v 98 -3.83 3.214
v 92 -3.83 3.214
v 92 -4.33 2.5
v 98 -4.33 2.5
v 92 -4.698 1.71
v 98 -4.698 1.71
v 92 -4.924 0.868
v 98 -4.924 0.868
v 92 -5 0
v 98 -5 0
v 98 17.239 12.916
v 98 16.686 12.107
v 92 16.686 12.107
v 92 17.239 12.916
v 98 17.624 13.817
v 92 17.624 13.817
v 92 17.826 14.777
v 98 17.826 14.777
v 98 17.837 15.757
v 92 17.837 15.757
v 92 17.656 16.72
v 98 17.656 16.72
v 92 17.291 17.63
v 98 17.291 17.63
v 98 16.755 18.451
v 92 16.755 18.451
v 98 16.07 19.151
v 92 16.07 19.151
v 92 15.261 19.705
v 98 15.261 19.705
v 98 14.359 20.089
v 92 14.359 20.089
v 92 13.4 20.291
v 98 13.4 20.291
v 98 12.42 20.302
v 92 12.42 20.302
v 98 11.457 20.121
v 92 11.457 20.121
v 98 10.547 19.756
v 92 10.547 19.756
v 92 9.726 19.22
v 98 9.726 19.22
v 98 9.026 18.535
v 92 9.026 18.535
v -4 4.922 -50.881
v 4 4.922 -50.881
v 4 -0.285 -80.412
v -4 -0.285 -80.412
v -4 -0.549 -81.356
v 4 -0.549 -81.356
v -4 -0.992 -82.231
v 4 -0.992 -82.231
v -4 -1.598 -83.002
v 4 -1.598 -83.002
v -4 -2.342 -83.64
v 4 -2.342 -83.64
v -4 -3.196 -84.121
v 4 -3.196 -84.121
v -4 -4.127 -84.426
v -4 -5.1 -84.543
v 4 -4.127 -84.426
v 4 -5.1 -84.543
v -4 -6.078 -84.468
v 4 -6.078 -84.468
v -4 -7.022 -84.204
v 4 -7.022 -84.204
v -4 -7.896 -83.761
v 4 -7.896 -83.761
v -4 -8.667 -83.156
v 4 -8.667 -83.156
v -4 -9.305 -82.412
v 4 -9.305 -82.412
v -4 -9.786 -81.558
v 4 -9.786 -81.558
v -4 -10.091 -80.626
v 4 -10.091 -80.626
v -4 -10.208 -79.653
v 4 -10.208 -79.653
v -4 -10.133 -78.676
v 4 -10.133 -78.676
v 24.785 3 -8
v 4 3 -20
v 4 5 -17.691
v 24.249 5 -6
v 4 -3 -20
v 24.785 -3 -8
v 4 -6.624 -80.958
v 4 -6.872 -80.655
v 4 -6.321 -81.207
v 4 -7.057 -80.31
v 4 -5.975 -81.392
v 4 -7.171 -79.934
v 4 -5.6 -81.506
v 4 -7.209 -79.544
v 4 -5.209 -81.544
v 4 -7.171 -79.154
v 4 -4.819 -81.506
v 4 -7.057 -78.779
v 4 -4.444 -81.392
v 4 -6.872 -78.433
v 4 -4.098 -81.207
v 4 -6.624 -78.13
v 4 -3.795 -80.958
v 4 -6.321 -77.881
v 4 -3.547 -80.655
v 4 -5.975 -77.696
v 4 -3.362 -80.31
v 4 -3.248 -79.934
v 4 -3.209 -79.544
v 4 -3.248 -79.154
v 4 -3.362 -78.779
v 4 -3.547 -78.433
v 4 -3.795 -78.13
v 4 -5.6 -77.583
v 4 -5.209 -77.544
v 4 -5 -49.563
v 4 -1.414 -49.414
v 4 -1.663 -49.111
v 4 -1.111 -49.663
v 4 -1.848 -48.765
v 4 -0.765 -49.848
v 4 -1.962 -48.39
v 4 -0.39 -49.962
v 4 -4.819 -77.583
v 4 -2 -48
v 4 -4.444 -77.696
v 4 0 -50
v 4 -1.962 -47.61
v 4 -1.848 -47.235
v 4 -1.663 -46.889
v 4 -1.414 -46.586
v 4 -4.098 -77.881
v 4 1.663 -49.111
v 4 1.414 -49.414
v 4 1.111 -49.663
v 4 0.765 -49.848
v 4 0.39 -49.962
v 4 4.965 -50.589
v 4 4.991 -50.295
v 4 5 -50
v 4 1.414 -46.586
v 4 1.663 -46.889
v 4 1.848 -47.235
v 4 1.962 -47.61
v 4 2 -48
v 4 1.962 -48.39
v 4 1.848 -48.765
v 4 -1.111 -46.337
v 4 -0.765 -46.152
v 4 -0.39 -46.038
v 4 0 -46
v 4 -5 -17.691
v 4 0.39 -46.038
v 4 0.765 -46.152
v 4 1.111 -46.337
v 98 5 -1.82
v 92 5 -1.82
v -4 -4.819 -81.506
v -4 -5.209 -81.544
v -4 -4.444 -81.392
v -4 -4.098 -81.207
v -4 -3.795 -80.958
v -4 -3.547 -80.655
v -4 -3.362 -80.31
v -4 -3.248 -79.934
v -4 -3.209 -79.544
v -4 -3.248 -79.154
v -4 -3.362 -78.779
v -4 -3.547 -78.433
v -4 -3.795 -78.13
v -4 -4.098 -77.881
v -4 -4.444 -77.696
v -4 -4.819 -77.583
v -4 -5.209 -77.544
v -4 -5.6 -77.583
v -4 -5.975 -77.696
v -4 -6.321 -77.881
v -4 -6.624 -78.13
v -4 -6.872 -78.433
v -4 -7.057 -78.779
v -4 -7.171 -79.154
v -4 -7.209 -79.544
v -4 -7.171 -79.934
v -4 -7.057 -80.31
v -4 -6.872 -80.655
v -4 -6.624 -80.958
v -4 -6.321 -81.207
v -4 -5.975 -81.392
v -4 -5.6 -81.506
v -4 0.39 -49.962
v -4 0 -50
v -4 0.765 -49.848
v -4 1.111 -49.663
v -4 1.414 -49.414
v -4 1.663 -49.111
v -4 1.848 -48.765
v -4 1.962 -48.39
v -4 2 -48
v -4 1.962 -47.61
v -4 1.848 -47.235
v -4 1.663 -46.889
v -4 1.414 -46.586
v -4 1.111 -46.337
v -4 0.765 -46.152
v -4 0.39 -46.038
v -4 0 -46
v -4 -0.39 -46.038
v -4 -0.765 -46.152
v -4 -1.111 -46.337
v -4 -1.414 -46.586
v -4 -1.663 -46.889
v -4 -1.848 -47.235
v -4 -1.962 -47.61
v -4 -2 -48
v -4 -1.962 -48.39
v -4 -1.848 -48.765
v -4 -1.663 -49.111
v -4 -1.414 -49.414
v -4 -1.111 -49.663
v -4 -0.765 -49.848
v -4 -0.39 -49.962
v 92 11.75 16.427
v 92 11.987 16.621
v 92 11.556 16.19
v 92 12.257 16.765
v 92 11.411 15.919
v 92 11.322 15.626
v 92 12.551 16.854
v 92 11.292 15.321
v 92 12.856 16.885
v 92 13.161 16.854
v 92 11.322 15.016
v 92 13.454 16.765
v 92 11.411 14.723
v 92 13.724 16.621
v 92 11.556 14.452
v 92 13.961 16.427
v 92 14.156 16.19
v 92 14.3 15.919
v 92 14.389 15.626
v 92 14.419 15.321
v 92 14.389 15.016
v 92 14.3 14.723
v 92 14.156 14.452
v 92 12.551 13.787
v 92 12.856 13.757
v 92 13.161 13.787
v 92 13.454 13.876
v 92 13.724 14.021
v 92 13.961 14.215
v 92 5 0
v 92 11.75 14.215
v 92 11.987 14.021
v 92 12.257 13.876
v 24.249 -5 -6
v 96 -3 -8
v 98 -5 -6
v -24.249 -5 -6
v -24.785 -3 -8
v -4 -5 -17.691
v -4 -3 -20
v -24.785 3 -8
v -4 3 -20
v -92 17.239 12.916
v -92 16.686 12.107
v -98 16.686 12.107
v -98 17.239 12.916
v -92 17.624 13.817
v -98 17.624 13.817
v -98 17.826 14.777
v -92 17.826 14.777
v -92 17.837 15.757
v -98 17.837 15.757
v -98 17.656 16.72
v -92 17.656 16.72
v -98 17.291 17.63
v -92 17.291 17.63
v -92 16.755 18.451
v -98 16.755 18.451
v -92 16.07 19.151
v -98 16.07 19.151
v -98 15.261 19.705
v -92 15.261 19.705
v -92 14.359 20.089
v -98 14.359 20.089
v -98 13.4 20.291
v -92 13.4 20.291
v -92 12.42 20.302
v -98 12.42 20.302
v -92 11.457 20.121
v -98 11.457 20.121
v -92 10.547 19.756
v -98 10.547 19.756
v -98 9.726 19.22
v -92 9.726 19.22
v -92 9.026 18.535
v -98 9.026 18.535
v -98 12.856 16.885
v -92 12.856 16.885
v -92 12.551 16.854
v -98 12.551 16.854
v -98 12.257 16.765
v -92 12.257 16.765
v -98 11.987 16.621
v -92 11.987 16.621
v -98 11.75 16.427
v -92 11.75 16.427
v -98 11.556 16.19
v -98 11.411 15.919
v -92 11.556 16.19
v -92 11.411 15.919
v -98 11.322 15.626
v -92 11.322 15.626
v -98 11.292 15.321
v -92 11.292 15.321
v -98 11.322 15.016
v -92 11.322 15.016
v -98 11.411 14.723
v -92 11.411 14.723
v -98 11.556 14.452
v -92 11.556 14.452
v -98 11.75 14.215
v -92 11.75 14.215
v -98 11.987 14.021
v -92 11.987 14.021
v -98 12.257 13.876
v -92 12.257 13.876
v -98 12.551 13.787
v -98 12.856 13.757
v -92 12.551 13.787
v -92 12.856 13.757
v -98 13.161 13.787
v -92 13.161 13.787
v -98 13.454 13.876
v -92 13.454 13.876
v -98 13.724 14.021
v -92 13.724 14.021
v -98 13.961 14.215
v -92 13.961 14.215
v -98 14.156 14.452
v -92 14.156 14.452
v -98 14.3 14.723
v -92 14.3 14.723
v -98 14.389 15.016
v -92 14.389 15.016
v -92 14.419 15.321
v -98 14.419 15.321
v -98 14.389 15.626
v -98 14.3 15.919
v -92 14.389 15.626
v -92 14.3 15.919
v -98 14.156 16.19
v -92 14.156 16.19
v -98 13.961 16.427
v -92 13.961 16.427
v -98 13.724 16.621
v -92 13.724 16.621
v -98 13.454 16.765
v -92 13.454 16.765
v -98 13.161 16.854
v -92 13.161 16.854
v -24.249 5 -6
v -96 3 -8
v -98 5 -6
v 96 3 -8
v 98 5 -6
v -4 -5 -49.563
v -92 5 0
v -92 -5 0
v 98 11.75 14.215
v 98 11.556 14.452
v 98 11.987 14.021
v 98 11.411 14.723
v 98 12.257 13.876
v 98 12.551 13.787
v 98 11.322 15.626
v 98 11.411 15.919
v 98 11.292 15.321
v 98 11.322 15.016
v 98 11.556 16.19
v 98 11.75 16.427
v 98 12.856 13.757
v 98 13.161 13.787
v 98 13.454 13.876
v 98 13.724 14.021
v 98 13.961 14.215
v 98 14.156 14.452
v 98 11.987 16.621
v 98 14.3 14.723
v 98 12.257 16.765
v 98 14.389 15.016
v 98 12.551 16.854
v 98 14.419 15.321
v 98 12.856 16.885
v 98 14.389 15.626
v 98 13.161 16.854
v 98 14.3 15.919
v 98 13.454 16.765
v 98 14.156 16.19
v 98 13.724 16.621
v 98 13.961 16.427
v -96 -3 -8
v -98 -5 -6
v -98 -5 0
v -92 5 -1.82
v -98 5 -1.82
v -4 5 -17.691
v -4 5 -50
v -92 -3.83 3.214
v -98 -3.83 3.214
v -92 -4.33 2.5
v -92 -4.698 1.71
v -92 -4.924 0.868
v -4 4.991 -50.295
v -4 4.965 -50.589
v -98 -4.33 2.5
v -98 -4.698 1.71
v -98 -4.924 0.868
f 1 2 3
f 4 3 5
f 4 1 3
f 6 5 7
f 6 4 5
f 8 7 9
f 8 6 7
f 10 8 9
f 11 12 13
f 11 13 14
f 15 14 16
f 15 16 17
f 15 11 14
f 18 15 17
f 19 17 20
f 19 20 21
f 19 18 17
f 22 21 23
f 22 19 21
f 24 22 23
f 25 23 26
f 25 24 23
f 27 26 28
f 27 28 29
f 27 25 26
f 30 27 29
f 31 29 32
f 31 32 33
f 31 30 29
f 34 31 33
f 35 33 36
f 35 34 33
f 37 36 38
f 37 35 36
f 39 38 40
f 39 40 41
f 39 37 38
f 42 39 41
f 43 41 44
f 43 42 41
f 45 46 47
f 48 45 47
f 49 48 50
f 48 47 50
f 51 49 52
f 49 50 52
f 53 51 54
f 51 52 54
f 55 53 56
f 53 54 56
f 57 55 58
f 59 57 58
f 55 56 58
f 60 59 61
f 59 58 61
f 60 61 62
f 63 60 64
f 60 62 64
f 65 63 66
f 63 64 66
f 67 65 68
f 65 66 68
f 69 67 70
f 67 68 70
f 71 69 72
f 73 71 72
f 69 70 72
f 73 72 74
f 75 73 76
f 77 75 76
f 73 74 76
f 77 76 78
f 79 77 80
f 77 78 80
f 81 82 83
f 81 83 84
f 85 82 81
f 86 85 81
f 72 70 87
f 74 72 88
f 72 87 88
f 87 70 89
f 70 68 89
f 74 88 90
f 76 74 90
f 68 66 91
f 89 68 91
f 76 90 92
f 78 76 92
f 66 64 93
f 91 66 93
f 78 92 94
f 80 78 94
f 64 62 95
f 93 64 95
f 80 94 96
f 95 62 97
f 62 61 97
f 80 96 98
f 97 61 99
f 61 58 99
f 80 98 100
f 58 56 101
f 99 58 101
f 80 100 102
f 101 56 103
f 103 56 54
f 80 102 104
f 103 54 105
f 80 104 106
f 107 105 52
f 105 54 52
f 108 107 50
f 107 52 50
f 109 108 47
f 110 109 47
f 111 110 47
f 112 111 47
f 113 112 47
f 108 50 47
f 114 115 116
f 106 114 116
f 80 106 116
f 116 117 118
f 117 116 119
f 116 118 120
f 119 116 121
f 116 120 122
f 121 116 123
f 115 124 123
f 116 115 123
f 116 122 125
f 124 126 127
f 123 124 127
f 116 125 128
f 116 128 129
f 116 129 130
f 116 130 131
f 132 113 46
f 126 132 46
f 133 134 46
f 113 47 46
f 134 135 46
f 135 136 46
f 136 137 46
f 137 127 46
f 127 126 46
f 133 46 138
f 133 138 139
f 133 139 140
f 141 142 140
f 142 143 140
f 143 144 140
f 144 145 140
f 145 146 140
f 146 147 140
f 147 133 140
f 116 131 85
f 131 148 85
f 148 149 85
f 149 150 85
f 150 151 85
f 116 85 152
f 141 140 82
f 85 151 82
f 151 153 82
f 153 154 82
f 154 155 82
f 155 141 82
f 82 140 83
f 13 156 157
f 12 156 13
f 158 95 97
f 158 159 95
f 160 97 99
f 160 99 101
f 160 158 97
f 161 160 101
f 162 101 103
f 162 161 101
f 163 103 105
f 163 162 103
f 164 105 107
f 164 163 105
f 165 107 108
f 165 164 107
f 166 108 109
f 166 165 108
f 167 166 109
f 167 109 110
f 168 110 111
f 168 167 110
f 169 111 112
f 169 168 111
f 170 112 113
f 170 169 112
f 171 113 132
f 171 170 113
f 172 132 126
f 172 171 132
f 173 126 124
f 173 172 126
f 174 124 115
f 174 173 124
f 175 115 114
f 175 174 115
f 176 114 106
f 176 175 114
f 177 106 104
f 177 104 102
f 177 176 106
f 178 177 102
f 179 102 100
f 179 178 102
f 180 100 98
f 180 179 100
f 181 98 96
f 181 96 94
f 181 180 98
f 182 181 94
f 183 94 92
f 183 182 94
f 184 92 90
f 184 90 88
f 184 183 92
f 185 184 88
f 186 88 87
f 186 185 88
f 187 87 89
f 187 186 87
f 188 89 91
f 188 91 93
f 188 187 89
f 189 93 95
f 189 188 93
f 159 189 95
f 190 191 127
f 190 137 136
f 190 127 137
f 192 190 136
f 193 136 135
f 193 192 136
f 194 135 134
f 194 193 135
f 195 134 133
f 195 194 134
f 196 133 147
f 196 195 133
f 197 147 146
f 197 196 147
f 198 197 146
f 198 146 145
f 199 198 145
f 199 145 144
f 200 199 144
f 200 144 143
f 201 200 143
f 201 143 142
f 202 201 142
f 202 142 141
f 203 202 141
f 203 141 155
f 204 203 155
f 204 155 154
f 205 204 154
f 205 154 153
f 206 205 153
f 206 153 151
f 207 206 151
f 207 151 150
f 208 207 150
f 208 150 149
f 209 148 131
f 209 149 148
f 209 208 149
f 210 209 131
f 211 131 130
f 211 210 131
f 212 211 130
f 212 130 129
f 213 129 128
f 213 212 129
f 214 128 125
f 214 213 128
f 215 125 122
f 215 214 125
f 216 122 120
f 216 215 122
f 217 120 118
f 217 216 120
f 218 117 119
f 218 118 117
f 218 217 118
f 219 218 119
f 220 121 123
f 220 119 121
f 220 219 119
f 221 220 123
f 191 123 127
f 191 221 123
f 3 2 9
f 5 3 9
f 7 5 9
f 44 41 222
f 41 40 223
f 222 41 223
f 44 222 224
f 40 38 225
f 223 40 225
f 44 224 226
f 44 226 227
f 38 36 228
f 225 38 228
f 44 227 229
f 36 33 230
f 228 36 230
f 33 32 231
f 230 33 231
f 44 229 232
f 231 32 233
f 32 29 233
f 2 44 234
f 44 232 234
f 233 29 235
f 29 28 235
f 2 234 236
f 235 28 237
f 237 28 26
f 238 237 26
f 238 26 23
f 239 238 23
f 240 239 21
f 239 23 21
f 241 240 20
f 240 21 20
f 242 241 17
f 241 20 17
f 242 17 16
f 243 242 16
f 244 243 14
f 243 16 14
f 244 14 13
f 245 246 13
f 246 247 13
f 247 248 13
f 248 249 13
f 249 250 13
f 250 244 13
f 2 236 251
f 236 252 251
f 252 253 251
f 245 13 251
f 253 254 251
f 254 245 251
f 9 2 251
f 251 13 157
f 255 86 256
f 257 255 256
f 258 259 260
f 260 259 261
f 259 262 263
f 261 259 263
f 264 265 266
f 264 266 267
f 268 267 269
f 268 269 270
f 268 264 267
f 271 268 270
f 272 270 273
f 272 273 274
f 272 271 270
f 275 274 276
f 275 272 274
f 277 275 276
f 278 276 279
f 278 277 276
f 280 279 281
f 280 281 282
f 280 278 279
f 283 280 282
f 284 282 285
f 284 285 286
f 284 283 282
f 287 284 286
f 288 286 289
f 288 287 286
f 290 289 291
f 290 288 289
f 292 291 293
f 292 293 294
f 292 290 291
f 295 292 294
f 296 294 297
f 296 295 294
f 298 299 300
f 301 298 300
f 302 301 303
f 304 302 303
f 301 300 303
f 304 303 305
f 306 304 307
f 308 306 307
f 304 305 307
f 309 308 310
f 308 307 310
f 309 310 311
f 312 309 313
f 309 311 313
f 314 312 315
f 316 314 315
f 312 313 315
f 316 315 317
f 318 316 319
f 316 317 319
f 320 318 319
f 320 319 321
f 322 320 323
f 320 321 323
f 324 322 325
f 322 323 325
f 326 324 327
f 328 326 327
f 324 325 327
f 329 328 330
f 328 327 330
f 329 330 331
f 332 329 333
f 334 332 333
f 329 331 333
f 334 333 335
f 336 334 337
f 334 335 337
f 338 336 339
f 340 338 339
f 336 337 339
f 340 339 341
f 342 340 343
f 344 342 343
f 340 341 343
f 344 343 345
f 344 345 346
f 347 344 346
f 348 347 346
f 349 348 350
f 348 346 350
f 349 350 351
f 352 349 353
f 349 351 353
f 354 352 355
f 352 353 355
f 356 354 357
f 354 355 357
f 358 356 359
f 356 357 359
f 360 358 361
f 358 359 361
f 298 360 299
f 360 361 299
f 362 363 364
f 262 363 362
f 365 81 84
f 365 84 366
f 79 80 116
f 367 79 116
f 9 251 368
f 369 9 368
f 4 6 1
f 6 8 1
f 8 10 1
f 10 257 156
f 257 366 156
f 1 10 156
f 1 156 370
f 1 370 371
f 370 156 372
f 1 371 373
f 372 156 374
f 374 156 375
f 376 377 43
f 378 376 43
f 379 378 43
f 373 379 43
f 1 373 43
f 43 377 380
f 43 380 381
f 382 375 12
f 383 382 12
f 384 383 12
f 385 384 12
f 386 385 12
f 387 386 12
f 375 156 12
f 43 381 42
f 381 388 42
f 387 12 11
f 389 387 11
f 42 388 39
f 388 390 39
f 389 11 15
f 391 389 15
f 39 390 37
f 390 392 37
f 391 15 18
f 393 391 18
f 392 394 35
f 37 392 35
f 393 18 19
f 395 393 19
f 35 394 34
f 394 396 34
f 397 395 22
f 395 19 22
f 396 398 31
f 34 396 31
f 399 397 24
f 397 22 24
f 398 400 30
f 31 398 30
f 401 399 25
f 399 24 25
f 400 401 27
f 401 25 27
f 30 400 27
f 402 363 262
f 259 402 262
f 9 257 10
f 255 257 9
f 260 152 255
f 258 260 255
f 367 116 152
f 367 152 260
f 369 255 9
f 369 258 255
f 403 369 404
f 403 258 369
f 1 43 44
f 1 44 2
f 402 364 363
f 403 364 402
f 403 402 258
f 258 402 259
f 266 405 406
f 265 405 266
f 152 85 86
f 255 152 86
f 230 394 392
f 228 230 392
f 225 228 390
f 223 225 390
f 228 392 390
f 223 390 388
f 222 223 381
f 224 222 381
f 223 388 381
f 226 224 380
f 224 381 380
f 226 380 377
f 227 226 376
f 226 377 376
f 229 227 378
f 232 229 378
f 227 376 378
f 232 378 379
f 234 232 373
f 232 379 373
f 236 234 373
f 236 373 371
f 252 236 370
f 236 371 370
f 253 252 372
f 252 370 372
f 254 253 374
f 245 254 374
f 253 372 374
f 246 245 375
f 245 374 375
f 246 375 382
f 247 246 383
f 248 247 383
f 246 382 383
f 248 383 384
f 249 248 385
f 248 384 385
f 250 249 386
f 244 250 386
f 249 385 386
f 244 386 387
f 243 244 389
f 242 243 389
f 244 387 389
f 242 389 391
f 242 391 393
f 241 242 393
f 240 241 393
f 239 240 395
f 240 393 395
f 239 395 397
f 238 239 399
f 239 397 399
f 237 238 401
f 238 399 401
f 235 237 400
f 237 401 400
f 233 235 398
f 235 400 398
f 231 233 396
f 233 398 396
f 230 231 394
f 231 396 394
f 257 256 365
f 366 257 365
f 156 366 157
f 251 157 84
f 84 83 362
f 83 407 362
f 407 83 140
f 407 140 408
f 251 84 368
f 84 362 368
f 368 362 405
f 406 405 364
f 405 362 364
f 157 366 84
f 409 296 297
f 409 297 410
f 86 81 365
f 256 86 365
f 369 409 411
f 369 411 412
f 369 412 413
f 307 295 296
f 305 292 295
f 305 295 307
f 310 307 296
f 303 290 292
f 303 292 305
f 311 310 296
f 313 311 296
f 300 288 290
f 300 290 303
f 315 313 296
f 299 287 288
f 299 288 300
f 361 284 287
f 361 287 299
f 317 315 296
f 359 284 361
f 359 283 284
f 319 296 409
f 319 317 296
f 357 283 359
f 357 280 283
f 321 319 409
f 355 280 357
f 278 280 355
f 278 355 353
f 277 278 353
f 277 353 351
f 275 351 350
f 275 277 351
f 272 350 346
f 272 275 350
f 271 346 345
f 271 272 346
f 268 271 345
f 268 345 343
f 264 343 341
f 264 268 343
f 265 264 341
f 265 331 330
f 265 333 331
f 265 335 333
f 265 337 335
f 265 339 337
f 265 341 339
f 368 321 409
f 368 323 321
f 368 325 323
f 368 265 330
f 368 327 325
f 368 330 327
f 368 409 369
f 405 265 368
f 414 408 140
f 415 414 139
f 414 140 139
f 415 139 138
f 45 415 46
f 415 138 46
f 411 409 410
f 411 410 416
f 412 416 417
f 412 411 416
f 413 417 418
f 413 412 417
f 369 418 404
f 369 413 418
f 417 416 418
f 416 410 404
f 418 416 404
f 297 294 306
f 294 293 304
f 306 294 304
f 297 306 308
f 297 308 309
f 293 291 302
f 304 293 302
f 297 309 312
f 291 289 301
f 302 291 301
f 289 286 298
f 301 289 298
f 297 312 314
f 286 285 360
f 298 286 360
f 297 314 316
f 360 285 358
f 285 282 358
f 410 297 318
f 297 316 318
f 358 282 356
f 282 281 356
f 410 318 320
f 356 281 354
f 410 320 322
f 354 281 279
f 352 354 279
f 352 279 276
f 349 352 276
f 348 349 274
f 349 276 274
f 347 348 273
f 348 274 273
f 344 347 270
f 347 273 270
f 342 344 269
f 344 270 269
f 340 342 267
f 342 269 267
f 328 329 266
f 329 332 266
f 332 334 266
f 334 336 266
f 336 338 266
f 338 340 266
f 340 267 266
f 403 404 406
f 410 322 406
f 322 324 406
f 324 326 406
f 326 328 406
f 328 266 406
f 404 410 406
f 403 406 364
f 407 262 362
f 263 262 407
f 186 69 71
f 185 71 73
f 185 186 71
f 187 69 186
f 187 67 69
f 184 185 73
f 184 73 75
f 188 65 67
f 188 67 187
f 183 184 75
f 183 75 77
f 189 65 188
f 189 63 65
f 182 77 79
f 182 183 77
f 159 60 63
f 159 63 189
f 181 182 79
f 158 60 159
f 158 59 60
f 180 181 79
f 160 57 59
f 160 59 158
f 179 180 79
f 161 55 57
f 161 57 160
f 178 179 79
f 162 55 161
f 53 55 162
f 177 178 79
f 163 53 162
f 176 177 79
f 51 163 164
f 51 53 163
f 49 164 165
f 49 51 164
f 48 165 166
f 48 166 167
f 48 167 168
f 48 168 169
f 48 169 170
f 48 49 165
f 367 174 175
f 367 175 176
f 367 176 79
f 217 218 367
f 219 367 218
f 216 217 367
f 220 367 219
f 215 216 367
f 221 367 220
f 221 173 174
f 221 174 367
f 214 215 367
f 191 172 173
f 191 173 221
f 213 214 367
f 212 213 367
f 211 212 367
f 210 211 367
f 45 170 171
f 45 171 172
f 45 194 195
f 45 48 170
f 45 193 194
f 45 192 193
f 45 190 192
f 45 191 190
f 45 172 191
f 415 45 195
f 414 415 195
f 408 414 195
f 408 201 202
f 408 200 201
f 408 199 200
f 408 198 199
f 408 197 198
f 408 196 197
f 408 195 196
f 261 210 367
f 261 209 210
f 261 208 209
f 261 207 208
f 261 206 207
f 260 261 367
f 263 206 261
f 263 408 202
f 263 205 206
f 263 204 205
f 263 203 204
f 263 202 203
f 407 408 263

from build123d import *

# Parameters (mm, degrees)
EXTRUDE_1_DEPTH          = 5
FILLET_1_R               = 5
EXTRUDE_START            = 98
SKETCH_9_R               = 1.563633766
EXTRUDE_4_DEPTH          = 6
EXTRUDE_START_2          = -92
SKETCH_9_2_R             = 1.563633766
EXTRUDE_5_DEPTH          = 6
SKETCH_10_R              = 2
EXTRUDE_6_DEPTH          = 4
CUT_EXTRUDE_1_DEPTH      = 131.654334604
CUT_EXTRUDE_1_DEPTH_BACK = 131.654334604
SKETCH_11_R              = 2
CHAMFER_1_SIZE           = 2


with BuildPart() as part:
    # 草图1 → 凸台-拉伸1 (new, symmetric)
    with BuildSketch(Plane(origin=(0, 0, 0), x_dir=(1, 0, 0), z_dir=(0, 1, 0))):
        Polygon((98, 0), (-98, 0), (-98, 8), (-24.784609691, 8), (-4, 20), (-4, 55), (4, 55), (4, 20), (24.784609691, 8), (98, 8), align=None)
    extrude(amount=EXTRUDE_1_DEPTH, both=True)

    # 圆角1
    fillet_1_edges = [part.edges().sort_by_distance(p)[0] for p in [
        (0, -5, -55),
        (0, 5, -55),
    ]]
    fillet(fillet_1_edges, radius=FILLET_1_R - 0.0001)  # a hair under: the kernel refuses the full size

    # 草图9 → 凸台-拉伸4 (add)
    with BuildSketch(Plane(origin=(0, 0, 0), x_dir=(0, 0, -1), z_dir=(1, 0, 0)).offset(EXTRUDE_START)):
        with BuildLine():
            Line((3.213938048, 3.830222216), (-12.106950814, 16.685974409))
            ThreePointArc((-12.106950814, 16.685974409), (-19.151111078, 16.069690242), (-18.534826911, 9.025529978))
            Line((-18.534826911, 9.025529978), (-3.213938048, -3.830222216))
            ThreePointArc((-3.213938048, -3.830222216), (3.830222216, -3.213938048), (3.213938048, 3.830222216))
        make_face()
        with Locations(Location((-15.320888862, 12.855752194, 0), (0, 0, 180))):
            Circle(SKETCH_9_R, mode=Mode.SUBTRACT)
    extrude(amount=-EXTRUDE_4_DEPTH)

    # 草图9<2> → 凸台-拉伸5 (add)
    with BuildSketch(Plane(origin=(0, 0, 0), x_dir=(0, 0, -1), z_dir=(1, 0, 0)).offset(EXTRUDE_START_2)):
        with BuildLine():
            Line((3.213938048, 3.830222216), (-12.106950814, 16.685974409))
            ThreePointArc((-12.106950814, 16.685974409), (-19.151111078, 16.069690242), (-18.534826911, 9.025529978))
            Line((-18.534826911, 9.025529978), (-3.213938048, -3.830222216))
            ThreePointArc((-3.213938048, -3.830222216), (3.830222216, -3.213938048), (3.213938048, 3.830222216))
        make_face()
        with Locations(Location((-15.320888862, 12.855752194, 0), (0, 0, 180))):
            Circle(SKETCH_9_2_R, mode=Mode.SUBTRACT)
    extrude(amount=-EXTRUDE_5_DEPTH)

    # 草图10 → 凸台-拉伸6 (add, symmetric)
    with BuildSketch(Plane(origin=(0, 0, 0), x_dir=(0, 0, -1), z_dir=(1, 0, 0))):
        with BuildLine():
            Line((50.868240888, 4.924038765), (80.412473479, -0.285406565))
            ThreePointArc((80.412473479, -0.285406565), (84.468271355, -6.077686218), (78.675991702, -10.133484095))
            Line((78.675991702, -10.133484095), (49.131759112, -4.924038765))
            ThreePointArc((49.131759112, -4.924038765), (45.075961235, 0.868240888), (50.868240888, 4.924038765))
        make_face()
        with Locations((79.54423259, -5.20944533)):
            Circle(SKETCH_10_R, mode=Mode.SUBTRACT)
    extrude(amount=EXTRUDE_6_DEPTH, both=True)

    # 草图11 → 切除-拉伸1 (cut, two sides: drawn at the far end of the back side and taken through both)
    with BuildSketch(Plane(origin=(0, 0, 0), x_dir=(0, 0, -1), z_dir=(1, 0, 0)).offset(-CUT_EXTRUDE_1_DEPTH_BACK)):
        with Locations((48, 0)):
            Circle(SKETCH_11_R)
    extrude(amount=CUT_EXTRUDE_1_DEPTH + CUT_EXTRUDE_1_DEPTH_BACK, mode=Mode.SUBTRACT)

    # 倒角1
    chamfer_1_edges = [part.edges().sort_by_distance(p)[0] for p in [
        (-61.392304845, -5, -8),
        (-14.392304845, -5, -14),
        (14.392304845, -5, -14),
        (61.392304845, -5, -8),
        (61.392304845, 5, -8),
        (-98, 0, -8),
        (98, 0, -8),
        (14.392304845, 5, -14),
        (-14.392304845, 5, -14),
        (-61.392304845, 5, -8),
    ]]
    chamfer(chamfer_1_edges, length=CHAMFER_1_SIZE)


solid = part.part
